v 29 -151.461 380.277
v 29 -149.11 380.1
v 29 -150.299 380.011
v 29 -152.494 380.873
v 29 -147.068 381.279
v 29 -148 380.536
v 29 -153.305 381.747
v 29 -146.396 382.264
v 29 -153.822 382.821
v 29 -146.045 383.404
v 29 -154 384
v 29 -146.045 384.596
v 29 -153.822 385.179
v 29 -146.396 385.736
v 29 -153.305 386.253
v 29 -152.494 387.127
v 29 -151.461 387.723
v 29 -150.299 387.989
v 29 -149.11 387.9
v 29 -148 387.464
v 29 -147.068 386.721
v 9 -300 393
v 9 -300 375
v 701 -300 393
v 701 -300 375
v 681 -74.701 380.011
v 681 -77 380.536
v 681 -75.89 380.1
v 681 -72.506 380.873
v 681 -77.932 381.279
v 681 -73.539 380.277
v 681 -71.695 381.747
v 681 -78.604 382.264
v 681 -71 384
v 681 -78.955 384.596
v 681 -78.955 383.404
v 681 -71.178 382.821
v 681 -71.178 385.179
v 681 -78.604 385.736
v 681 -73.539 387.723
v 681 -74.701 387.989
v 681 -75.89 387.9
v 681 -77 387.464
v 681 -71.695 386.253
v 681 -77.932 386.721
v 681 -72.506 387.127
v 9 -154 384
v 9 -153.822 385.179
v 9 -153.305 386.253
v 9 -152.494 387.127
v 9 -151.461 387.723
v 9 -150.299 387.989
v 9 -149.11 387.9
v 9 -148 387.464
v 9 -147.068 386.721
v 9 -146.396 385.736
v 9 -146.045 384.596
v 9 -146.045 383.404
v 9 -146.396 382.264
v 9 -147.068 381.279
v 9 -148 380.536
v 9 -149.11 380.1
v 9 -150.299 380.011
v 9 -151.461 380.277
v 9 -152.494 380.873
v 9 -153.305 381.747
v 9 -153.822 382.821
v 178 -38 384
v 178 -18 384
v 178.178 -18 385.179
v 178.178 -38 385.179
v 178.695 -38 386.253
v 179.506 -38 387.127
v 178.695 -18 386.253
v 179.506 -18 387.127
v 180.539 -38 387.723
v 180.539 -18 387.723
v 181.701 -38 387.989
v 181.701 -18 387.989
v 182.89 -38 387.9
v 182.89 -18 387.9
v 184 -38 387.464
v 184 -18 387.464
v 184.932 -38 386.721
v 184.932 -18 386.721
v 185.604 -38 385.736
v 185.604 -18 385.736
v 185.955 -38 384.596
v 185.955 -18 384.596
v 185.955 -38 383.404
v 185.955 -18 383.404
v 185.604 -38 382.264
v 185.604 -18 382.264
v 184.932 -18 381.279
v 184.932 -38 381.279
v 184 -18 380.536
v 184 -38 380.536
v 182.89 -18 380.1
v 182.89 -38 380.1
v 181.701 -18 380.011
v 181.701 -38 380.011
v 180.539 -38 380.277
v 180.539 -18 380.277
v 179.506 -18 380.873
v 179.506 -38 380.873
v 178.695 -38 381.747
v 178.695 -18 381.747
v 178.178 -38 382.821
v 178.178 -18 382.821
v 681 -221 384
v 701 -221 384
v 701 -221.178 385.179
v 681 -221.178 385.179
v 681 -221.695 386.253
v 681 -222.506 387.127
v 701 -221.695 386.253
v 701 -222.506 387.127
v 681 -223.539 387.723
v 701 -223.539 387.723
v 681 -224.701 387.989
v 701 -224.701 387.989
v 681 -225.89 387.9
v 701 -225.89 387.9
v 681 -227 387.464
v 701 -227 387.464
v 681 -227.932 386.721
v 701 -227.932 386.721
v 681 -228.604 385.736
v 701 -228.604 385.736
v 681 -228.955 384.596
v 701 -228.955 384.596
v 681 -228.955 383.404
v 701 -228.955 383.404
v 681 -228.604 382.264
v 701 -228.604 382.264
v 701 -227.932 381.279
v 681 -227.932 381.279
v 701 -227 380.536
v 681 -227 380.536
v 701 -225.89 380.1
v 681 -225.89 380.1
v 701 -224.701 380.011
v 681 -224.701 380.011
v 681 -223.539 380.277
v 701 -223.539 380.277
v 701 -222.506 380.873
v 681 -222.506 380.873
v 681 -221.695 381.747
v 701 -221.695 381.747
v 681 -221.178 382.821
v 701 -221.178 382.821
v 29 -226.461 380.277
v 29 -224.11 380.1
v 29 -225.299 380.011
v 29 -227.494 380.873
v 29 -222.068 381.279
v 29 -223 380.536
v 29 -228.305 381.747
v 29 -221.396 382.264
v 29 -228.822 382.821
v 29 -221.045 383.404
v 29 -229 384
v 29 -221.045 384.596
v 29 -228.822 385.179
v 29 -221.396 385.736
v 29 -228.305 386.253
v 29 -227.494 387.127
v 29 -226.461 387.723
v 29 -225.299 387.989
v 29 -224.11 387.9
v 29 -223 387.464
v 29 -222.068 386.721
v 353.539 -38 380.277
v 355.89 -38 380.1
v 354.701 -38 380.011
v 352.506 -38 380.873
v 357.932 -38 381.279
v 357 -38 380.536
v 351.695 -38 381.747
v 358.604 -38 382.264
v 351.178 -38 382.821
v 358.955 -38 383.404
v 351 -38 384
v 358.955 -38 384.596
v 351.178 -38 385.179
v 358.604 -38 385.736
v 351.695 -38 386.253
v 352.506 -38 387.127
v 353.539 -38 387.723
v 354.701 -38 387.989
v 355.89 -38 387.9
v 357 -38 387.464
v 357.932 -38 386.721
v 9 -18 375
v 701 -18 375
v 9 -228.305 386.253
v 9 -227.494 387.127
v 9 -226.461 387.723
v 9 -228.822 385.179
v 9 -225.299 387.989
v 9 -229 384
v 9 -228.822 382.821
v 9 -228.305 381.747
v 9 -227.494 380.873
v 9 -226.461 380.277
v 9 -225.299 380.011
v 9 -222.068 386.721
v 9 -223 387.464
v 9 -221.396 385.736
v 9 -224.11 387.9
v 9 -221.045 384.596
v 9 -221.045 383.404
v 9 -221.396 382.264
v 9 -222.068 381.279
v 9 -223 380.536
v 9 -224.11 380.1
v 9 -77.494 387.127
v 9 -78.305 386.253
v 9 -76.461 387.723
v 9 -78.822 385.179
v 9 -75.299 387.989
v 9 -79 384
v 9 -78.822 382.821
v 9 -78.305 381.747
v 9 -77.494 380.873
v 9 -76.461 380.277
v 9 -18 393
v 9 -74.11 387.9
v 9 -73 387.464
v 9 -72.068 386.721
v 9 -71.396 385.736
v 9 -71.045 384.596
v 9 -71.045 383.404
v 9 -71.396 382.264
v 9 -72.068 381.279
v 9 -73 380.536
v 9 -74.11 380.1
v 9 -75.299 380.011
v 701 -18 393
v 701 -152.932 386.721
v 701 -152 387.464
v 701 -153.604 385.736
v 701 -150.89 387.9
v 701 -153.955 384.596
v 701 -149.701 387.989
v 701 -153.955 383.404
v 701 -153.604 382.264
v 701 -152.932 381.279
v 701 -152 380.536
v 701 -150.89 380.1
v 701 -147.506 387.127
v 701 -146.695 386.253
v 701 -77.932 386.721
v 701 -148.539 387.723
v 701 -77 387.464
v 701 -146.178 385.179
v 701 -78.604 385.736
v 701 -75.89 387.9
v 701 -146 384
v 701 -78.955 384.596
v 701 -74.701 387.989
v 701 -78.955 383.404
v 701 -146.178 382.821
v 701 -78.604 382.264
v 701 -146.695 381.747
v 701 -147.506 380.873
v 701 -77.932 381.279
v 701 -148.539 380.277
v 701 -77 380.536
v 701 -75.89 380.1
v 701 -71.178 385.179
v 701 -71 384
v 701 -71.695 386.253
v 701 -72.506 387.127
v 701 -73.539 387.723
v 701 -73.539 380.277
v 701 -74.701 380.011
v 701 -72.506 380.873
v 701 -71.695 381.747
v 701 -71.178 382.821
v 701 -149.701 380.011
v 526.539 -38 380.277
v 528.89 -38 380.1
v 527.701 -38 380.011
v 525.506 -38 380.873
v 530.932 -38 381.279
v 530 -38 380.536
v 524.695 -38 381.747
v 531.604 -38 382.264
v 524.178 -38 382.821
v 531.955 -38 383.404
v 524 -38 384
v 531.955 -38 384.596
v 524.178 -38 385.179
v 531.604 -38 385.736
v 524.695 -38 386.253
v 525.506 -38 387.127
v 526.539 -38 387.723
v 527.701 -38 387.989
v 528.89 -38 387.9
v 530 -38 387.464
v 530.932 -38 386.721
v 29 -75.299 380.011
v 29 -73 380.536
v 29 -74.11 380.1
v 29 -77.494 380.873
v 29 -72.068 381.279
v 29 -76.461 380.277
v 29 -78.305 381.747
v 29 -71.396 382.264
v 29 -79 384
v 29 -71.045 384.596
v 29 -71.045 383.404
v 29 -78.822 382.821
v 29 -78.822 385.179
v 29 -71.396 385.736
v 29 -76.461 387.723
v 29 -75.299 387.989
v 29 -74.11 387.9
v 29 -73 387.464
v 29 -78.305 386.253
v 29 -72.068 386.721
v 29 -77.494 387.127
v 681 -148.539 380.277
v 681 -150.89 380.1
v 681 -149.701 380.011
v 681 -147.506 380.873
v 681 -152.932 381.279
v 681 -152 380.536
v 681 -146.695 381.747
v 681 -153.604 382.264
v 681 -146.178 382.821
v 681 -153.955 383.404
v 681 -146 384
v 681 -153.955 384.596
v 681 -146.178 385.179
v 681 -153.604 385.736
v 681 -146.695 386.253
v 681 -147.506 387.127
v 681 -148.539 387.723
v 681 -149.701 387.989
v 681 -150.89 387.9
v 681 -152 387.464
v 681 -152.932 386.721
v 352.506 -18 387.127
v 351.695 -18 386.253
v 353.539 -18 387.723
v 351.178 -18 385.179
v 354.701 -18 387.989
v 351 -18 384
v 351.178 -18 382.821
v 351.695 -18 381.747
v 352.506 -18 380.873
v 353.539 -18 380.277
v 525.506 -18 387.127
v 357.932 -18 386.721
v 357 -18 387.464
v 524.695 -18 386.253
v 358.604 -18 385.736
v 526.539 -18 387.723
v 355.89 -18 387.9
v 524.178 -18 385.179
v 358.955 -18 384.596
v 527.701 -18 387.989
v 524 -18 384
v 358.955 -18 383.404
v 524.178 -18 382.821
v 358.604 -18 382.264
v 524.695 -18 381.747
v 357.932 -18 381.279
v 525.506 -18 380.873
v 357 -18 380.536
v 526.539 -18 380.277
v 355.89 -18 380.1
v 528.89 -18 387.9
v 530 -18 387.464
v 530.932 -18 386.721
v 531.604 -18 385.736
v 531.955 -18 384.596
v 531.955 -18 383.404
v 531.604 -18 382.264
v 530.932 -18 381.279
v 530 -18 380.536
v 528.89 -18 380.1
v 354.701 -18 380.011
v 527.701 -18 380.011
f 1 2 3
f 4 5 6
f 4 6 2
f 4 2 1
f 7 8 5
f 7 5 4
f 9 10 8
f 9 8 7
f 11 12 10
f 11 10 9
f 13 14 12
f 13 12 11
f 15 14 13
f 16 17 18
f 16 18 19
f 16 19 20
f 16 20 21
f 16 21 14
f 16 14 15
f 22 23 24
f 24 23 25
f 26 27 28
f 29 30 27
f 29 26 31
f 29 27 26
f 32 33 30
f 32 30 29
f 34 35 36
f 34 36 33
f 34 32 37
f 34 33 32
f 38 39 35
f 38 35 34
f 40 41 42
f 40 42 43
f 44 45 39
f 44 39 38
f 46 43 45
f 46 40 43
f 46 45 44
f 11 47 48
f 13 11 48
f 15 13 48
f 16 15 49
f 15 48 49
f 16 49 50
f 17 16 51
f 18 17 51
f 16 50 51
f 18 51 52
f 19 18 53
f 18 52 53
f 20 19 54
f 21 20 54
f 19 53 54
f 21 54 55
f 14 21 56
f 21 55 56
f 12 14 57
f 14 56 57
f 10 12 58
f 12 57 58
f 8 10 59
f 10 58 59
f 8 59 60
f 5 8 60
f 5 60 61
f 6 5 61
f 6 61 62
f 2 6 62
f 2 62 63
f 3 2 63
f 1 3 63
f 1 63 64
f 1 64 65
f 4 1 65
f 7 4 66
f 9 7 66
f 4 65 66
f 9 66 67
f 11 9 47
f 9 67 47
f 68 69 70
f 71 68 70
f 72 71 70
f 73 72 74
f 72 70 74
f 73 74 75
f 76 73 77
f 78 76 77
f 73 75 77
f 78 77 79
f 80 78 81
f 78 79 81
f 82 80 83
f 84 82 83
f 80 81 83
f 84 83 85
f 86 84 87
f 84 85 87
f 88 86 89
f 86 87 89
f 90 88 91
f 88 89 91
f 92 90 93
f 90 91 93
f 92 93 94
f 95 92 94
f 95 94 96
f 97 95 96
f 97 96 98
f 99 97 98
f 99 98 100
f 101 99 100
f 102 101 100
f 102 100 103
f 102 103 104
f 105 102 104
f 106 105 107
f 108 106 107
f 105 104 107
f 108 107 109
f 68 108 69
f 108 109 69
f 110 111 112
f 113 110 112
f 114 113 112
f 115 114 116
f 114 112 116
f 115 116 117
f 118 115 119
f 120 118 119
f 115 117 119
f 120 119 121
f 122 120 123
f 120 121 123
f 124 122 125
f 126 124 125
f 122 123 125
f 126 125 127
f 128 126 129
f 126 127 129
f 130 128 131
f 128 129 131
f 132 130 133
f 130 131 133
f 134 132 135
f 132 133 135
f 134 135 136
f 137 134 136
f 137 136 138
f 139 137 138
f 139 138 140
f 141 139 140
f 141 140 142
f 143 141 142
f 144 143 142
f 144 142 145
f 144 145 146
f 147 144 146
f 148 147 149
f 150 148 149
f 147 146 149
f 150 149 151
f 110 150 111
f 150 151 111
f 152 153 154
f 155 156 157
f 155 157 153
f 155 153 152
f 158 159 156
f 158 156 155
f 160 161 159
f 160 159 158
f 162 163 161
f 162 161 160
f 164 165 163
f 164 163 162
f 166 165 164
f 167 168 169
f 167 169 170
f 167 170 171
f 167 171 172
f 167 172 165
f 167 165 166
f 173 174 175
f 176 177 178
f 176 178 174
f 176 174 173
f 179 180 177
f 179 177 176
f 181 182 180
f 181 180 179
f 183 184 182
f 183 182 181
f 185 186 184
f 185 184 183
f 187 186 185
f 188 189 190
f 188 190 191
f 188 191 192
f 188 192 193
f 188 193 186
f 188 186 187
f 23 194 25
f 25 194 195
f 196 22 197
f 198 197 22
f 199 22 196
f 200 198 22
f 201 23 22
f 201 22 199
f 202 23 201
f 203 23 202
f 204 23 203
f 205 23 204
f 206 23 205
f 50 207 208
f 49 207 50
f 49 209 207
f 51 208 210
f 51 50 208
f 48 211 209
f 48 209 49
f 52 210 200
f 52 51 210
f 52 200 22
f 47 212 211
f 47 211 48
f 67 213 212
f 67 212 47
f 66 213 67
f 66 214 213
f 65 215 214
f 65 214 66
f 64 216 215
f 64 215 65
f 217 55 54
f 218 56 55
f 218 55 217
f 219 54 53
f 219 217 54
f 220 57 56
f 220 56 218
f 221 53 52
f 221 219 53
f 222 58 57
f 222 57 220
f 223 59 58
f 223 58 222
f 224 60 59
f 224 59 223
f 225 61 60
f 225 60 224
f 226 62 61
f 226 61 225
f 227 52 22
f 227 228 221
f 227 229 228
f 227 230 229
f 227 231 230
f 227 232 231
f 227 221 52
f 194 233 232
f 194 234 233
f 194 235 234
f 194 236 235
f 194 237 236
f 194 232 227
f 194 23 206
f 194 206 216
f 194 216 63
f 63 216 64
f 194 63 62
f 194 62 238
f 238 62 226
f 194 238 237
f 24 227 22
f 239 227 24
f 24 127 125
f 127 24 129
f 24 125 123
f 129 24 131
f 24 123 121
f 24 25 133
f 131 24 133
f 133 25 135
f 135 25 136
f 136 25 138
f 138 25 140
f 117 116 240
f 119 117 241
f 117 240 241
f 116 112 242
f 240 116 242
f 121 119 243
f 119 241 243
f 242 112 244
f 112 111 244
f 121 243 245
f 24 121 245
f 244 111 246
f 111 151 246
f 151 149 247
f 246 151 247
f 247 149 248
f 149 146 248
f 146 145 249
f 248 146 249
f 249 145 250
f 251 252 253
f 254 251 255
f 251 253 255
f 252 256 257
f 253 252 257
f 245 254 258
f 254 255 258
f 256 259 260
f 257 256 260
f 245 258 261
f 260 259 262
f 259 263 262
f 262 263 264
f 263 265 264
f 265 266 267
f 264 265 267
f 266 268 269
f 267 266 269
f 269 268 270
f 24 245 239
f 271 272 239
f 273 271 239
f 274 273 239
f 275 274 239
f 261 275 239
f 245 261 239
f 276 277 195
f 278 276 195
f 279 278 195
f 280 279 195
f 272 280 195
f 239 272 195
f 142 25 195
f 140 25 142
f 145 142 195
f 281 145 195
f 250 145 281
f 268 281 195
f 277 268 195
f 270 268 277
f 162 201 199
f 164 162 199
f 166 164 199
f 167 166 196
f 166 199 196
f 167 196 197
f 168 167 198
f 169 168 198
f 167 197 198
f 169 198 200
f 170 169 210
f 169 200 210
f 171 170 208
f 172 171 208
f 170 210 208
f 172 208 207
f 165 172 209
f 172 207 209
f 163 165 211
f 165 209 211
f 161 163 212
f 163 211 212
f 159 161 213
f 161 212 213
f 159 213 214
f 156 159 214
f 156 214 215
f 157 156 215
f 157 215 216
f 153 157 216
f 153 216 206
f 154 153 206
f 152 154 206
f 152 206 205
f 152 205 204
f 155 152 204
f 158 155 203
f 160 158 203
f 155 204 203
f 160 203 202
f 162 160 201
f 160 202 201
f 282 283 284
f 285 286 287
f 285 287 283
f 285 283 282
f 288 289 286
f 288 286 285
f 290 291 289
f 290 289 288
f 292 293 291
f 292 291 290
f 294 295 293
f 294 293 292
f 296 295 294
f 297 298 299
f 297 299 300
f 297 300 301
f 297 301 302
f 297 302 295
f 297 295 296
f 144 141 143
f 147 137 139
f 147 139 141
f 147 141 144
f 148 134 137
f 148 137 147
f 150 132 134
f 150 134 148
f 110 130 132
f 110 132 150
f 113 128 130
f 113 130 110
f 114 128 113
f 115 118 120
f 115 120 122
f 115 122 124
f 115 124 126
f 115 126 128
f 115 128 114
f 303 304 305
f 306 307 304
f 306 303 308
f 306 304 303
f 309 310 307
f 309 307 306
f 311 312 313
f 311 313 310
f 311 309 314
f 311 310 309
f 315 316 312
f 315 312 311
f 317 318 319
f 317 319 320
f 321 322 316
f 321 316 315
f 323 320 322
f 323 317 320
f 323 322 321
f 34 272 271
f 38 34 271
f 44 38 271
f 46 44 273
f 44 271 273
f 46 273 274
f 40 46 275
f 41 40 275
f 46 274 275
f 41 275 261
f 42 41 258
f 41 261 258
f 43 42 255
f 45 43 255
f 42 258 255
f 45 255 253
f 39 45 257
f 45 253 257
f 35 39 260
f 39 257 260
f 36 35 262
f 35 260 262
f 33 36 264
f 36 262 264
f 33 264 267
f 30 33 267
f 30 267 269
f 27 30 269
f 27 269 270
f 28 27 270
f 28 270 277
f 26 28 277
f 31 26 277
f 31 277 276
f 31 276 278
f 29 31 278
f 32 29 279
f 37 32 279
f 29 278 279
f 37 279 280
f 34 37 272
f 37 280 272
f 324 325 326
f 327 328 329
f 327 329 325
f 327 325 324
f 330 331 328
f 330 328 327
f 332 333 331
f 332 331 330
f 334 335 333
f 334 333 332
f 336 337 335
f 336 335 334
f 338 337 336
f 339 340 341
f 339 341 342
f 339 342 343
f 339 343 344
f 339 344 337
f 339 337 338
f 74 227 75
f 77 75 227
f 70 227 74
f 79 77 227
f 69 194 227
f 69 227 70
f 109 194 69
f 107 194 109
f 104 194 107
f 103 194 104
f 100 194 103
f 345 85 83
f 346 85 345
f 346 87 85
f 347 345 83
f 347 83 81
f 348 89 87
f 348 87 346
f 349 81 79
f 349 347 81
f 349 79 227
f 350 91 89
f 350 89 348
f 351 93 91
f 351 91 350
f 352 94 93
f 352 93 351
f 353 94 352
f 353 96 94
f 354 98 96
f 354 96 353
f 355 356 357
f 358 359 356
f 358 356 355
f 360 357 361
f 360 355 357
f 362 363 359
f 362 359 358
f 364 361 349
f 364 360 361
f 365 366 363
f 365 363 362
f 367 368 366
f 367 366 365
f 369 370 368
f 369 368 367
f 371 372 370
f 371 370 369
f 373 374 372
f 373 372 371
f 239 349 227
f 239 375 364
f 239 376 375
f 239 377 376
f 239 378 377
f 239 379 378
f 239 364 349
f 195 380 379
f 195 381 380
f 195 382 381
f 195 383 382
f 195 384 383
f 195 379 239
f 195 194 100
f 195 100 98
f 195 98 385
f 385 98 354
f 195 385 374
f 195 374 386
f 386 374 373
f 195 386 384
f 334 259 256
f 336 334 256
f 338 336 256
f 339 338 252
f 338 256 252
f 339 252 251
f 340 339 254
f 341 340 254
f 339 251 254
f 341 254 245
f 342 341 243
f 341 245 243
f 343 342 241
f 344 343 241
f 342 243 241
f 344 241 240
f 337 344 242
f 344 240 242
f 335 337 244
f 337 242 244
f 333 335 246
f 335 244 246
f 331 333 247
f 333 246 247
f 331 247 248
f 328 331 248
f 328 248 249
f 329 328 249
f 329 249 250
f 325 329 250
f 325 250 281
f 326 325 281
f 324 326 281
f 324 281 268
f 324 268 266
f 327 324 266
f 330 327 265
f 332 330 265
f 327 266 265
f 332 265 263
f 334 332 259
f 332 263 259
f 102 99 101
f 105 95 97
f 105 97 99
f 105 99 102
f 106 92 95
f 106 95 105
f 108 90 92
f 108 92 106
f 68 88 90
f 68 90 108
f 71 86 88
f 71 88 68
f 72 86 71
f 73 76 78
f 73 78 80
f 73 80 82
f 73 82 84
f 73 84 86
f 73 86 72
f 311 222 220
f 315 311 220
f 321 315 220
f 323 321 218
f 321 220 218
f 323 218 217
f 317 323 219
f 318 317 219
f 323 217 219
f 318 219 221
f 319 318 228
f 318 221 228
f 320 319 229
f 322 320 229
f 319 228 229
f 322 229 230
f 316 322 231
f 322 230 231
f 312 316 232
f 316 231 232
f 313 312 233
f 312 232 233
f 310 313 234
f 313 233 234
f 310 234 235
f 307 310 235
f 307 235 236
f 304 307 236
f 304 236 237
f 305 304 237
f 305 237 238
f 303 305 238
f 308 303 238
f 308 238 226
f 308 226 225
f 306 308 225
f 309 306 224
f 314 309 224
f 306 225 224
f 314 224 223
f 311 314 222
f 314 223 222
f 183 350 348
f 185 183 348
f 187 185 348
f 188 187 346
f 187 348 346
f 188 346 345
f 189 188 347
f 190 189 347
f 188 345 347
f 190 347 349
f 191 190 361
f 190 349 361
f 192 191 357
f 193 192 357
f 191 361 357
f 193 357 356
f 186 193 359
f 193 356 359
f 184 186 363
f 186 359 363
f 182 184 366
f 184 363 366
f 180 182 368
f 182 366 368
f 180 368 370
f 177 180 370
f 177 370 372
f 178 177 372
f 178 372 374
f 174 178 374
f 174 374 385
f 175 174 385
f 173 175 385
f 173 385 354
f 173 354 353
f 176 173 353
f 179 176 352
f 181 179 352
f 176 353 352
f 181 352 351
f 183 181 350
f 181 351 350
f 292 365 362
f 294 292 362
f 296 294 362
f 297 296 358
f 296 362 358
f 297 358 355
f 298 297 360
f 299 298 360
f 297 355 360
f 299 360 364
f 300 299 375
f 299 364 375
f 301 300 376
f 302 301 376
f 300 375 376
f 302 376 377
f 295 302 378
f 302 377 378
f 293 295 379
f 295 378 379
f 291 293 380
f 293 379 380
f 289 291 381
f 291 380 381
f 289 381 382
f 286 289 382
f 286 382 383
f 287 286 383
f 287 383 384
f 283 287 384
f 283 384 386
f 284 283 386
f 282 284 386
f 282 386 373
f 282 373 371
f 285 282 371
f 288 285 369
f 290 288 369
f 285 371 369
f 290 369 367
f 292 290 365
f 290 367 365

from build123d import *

# Parameters (mm, degrees)
SKETCH067_W     = 692
SKETCH067_H     = 282
PAD025_DEPTH    = 18
SKETCH077_R     = 4
POCKET027_DEPTH = 20
SKETCH078_R     = 4
POCKET028_DEPTH = 20
SKETCH079_R     = 4
POCKET029_DEPTH = 20


with BuildPart() as part:
    # Sketch067 → Pad025 (new body)
    with BuildSketch(Plane.XY):
        with Locations((-355, -159)):
            Rectangle(SKETCH067_W, SKETCH067_H)
    extrude(amount=PAD025_DEPTH)

    # Sketch077 (on Face4 of Pad025) → Pocket027 (cut)
    with BuildSketch(Plane(origin=(-701, 0, 0), x_dir=(0, -1, 0), z_dir=(-1, 0, 0))):
        with Locations((150, 9)):
            Circle(SKETCH077_R)
        with Locations((225, 9)):
            Circle(SKETCH077_R)
        with Locations((75, 9)):
            Circle(SKETCH077_R)
    extrude(amount=-POCKET027_DEPTH, mode=Mode.SUBTRACT)

    # Sketch078 (on Face3 of Pocket027) → Pocket028 (cut)
    with BuildSketch(Plane.YZ.offset(-9)):
        with Locations((-225, 9)):
            Circle(SKETCH078_R)
        with Locations((-150, 9)):
            Circle(SKETCH078_R)
        with Locations((-75, 9)):
            Circle(SKETCH078_R)
    extrude(amount=-POCKET028_DEPTH, mode=Mode.SUBTRACT)

    # Sketch079 (on Face1 of Pocket028) → Pocket029 (cut)
    with BuildSketch(Plane(origin=(0, -18, 0), x_dir=(-1, 0, 0), z_dir=(0, 1, 0))):
        with Locations((182, 9)):
            Circle(SKETCH079_R)
        with Locations((355, 9)):
            Circle(SKETCH079_R)
        with Locations((528, 9)):
            Circle(SKETCH079_R)
    extrude(amount=-POCKET029_DEPTH, mode=Mode.SUBTRACT)


with BuildPart() as part_1:
    # Body018001001001010001003001003001001022 placement: moved
    add(part.part.moved(Location((0, 0, 375))))


with BuildPart() as part_2:
    # Clone015 placement: moved
    add(part_1.part.moved(Location((710, 0, 0))))


solid = part_2.part
